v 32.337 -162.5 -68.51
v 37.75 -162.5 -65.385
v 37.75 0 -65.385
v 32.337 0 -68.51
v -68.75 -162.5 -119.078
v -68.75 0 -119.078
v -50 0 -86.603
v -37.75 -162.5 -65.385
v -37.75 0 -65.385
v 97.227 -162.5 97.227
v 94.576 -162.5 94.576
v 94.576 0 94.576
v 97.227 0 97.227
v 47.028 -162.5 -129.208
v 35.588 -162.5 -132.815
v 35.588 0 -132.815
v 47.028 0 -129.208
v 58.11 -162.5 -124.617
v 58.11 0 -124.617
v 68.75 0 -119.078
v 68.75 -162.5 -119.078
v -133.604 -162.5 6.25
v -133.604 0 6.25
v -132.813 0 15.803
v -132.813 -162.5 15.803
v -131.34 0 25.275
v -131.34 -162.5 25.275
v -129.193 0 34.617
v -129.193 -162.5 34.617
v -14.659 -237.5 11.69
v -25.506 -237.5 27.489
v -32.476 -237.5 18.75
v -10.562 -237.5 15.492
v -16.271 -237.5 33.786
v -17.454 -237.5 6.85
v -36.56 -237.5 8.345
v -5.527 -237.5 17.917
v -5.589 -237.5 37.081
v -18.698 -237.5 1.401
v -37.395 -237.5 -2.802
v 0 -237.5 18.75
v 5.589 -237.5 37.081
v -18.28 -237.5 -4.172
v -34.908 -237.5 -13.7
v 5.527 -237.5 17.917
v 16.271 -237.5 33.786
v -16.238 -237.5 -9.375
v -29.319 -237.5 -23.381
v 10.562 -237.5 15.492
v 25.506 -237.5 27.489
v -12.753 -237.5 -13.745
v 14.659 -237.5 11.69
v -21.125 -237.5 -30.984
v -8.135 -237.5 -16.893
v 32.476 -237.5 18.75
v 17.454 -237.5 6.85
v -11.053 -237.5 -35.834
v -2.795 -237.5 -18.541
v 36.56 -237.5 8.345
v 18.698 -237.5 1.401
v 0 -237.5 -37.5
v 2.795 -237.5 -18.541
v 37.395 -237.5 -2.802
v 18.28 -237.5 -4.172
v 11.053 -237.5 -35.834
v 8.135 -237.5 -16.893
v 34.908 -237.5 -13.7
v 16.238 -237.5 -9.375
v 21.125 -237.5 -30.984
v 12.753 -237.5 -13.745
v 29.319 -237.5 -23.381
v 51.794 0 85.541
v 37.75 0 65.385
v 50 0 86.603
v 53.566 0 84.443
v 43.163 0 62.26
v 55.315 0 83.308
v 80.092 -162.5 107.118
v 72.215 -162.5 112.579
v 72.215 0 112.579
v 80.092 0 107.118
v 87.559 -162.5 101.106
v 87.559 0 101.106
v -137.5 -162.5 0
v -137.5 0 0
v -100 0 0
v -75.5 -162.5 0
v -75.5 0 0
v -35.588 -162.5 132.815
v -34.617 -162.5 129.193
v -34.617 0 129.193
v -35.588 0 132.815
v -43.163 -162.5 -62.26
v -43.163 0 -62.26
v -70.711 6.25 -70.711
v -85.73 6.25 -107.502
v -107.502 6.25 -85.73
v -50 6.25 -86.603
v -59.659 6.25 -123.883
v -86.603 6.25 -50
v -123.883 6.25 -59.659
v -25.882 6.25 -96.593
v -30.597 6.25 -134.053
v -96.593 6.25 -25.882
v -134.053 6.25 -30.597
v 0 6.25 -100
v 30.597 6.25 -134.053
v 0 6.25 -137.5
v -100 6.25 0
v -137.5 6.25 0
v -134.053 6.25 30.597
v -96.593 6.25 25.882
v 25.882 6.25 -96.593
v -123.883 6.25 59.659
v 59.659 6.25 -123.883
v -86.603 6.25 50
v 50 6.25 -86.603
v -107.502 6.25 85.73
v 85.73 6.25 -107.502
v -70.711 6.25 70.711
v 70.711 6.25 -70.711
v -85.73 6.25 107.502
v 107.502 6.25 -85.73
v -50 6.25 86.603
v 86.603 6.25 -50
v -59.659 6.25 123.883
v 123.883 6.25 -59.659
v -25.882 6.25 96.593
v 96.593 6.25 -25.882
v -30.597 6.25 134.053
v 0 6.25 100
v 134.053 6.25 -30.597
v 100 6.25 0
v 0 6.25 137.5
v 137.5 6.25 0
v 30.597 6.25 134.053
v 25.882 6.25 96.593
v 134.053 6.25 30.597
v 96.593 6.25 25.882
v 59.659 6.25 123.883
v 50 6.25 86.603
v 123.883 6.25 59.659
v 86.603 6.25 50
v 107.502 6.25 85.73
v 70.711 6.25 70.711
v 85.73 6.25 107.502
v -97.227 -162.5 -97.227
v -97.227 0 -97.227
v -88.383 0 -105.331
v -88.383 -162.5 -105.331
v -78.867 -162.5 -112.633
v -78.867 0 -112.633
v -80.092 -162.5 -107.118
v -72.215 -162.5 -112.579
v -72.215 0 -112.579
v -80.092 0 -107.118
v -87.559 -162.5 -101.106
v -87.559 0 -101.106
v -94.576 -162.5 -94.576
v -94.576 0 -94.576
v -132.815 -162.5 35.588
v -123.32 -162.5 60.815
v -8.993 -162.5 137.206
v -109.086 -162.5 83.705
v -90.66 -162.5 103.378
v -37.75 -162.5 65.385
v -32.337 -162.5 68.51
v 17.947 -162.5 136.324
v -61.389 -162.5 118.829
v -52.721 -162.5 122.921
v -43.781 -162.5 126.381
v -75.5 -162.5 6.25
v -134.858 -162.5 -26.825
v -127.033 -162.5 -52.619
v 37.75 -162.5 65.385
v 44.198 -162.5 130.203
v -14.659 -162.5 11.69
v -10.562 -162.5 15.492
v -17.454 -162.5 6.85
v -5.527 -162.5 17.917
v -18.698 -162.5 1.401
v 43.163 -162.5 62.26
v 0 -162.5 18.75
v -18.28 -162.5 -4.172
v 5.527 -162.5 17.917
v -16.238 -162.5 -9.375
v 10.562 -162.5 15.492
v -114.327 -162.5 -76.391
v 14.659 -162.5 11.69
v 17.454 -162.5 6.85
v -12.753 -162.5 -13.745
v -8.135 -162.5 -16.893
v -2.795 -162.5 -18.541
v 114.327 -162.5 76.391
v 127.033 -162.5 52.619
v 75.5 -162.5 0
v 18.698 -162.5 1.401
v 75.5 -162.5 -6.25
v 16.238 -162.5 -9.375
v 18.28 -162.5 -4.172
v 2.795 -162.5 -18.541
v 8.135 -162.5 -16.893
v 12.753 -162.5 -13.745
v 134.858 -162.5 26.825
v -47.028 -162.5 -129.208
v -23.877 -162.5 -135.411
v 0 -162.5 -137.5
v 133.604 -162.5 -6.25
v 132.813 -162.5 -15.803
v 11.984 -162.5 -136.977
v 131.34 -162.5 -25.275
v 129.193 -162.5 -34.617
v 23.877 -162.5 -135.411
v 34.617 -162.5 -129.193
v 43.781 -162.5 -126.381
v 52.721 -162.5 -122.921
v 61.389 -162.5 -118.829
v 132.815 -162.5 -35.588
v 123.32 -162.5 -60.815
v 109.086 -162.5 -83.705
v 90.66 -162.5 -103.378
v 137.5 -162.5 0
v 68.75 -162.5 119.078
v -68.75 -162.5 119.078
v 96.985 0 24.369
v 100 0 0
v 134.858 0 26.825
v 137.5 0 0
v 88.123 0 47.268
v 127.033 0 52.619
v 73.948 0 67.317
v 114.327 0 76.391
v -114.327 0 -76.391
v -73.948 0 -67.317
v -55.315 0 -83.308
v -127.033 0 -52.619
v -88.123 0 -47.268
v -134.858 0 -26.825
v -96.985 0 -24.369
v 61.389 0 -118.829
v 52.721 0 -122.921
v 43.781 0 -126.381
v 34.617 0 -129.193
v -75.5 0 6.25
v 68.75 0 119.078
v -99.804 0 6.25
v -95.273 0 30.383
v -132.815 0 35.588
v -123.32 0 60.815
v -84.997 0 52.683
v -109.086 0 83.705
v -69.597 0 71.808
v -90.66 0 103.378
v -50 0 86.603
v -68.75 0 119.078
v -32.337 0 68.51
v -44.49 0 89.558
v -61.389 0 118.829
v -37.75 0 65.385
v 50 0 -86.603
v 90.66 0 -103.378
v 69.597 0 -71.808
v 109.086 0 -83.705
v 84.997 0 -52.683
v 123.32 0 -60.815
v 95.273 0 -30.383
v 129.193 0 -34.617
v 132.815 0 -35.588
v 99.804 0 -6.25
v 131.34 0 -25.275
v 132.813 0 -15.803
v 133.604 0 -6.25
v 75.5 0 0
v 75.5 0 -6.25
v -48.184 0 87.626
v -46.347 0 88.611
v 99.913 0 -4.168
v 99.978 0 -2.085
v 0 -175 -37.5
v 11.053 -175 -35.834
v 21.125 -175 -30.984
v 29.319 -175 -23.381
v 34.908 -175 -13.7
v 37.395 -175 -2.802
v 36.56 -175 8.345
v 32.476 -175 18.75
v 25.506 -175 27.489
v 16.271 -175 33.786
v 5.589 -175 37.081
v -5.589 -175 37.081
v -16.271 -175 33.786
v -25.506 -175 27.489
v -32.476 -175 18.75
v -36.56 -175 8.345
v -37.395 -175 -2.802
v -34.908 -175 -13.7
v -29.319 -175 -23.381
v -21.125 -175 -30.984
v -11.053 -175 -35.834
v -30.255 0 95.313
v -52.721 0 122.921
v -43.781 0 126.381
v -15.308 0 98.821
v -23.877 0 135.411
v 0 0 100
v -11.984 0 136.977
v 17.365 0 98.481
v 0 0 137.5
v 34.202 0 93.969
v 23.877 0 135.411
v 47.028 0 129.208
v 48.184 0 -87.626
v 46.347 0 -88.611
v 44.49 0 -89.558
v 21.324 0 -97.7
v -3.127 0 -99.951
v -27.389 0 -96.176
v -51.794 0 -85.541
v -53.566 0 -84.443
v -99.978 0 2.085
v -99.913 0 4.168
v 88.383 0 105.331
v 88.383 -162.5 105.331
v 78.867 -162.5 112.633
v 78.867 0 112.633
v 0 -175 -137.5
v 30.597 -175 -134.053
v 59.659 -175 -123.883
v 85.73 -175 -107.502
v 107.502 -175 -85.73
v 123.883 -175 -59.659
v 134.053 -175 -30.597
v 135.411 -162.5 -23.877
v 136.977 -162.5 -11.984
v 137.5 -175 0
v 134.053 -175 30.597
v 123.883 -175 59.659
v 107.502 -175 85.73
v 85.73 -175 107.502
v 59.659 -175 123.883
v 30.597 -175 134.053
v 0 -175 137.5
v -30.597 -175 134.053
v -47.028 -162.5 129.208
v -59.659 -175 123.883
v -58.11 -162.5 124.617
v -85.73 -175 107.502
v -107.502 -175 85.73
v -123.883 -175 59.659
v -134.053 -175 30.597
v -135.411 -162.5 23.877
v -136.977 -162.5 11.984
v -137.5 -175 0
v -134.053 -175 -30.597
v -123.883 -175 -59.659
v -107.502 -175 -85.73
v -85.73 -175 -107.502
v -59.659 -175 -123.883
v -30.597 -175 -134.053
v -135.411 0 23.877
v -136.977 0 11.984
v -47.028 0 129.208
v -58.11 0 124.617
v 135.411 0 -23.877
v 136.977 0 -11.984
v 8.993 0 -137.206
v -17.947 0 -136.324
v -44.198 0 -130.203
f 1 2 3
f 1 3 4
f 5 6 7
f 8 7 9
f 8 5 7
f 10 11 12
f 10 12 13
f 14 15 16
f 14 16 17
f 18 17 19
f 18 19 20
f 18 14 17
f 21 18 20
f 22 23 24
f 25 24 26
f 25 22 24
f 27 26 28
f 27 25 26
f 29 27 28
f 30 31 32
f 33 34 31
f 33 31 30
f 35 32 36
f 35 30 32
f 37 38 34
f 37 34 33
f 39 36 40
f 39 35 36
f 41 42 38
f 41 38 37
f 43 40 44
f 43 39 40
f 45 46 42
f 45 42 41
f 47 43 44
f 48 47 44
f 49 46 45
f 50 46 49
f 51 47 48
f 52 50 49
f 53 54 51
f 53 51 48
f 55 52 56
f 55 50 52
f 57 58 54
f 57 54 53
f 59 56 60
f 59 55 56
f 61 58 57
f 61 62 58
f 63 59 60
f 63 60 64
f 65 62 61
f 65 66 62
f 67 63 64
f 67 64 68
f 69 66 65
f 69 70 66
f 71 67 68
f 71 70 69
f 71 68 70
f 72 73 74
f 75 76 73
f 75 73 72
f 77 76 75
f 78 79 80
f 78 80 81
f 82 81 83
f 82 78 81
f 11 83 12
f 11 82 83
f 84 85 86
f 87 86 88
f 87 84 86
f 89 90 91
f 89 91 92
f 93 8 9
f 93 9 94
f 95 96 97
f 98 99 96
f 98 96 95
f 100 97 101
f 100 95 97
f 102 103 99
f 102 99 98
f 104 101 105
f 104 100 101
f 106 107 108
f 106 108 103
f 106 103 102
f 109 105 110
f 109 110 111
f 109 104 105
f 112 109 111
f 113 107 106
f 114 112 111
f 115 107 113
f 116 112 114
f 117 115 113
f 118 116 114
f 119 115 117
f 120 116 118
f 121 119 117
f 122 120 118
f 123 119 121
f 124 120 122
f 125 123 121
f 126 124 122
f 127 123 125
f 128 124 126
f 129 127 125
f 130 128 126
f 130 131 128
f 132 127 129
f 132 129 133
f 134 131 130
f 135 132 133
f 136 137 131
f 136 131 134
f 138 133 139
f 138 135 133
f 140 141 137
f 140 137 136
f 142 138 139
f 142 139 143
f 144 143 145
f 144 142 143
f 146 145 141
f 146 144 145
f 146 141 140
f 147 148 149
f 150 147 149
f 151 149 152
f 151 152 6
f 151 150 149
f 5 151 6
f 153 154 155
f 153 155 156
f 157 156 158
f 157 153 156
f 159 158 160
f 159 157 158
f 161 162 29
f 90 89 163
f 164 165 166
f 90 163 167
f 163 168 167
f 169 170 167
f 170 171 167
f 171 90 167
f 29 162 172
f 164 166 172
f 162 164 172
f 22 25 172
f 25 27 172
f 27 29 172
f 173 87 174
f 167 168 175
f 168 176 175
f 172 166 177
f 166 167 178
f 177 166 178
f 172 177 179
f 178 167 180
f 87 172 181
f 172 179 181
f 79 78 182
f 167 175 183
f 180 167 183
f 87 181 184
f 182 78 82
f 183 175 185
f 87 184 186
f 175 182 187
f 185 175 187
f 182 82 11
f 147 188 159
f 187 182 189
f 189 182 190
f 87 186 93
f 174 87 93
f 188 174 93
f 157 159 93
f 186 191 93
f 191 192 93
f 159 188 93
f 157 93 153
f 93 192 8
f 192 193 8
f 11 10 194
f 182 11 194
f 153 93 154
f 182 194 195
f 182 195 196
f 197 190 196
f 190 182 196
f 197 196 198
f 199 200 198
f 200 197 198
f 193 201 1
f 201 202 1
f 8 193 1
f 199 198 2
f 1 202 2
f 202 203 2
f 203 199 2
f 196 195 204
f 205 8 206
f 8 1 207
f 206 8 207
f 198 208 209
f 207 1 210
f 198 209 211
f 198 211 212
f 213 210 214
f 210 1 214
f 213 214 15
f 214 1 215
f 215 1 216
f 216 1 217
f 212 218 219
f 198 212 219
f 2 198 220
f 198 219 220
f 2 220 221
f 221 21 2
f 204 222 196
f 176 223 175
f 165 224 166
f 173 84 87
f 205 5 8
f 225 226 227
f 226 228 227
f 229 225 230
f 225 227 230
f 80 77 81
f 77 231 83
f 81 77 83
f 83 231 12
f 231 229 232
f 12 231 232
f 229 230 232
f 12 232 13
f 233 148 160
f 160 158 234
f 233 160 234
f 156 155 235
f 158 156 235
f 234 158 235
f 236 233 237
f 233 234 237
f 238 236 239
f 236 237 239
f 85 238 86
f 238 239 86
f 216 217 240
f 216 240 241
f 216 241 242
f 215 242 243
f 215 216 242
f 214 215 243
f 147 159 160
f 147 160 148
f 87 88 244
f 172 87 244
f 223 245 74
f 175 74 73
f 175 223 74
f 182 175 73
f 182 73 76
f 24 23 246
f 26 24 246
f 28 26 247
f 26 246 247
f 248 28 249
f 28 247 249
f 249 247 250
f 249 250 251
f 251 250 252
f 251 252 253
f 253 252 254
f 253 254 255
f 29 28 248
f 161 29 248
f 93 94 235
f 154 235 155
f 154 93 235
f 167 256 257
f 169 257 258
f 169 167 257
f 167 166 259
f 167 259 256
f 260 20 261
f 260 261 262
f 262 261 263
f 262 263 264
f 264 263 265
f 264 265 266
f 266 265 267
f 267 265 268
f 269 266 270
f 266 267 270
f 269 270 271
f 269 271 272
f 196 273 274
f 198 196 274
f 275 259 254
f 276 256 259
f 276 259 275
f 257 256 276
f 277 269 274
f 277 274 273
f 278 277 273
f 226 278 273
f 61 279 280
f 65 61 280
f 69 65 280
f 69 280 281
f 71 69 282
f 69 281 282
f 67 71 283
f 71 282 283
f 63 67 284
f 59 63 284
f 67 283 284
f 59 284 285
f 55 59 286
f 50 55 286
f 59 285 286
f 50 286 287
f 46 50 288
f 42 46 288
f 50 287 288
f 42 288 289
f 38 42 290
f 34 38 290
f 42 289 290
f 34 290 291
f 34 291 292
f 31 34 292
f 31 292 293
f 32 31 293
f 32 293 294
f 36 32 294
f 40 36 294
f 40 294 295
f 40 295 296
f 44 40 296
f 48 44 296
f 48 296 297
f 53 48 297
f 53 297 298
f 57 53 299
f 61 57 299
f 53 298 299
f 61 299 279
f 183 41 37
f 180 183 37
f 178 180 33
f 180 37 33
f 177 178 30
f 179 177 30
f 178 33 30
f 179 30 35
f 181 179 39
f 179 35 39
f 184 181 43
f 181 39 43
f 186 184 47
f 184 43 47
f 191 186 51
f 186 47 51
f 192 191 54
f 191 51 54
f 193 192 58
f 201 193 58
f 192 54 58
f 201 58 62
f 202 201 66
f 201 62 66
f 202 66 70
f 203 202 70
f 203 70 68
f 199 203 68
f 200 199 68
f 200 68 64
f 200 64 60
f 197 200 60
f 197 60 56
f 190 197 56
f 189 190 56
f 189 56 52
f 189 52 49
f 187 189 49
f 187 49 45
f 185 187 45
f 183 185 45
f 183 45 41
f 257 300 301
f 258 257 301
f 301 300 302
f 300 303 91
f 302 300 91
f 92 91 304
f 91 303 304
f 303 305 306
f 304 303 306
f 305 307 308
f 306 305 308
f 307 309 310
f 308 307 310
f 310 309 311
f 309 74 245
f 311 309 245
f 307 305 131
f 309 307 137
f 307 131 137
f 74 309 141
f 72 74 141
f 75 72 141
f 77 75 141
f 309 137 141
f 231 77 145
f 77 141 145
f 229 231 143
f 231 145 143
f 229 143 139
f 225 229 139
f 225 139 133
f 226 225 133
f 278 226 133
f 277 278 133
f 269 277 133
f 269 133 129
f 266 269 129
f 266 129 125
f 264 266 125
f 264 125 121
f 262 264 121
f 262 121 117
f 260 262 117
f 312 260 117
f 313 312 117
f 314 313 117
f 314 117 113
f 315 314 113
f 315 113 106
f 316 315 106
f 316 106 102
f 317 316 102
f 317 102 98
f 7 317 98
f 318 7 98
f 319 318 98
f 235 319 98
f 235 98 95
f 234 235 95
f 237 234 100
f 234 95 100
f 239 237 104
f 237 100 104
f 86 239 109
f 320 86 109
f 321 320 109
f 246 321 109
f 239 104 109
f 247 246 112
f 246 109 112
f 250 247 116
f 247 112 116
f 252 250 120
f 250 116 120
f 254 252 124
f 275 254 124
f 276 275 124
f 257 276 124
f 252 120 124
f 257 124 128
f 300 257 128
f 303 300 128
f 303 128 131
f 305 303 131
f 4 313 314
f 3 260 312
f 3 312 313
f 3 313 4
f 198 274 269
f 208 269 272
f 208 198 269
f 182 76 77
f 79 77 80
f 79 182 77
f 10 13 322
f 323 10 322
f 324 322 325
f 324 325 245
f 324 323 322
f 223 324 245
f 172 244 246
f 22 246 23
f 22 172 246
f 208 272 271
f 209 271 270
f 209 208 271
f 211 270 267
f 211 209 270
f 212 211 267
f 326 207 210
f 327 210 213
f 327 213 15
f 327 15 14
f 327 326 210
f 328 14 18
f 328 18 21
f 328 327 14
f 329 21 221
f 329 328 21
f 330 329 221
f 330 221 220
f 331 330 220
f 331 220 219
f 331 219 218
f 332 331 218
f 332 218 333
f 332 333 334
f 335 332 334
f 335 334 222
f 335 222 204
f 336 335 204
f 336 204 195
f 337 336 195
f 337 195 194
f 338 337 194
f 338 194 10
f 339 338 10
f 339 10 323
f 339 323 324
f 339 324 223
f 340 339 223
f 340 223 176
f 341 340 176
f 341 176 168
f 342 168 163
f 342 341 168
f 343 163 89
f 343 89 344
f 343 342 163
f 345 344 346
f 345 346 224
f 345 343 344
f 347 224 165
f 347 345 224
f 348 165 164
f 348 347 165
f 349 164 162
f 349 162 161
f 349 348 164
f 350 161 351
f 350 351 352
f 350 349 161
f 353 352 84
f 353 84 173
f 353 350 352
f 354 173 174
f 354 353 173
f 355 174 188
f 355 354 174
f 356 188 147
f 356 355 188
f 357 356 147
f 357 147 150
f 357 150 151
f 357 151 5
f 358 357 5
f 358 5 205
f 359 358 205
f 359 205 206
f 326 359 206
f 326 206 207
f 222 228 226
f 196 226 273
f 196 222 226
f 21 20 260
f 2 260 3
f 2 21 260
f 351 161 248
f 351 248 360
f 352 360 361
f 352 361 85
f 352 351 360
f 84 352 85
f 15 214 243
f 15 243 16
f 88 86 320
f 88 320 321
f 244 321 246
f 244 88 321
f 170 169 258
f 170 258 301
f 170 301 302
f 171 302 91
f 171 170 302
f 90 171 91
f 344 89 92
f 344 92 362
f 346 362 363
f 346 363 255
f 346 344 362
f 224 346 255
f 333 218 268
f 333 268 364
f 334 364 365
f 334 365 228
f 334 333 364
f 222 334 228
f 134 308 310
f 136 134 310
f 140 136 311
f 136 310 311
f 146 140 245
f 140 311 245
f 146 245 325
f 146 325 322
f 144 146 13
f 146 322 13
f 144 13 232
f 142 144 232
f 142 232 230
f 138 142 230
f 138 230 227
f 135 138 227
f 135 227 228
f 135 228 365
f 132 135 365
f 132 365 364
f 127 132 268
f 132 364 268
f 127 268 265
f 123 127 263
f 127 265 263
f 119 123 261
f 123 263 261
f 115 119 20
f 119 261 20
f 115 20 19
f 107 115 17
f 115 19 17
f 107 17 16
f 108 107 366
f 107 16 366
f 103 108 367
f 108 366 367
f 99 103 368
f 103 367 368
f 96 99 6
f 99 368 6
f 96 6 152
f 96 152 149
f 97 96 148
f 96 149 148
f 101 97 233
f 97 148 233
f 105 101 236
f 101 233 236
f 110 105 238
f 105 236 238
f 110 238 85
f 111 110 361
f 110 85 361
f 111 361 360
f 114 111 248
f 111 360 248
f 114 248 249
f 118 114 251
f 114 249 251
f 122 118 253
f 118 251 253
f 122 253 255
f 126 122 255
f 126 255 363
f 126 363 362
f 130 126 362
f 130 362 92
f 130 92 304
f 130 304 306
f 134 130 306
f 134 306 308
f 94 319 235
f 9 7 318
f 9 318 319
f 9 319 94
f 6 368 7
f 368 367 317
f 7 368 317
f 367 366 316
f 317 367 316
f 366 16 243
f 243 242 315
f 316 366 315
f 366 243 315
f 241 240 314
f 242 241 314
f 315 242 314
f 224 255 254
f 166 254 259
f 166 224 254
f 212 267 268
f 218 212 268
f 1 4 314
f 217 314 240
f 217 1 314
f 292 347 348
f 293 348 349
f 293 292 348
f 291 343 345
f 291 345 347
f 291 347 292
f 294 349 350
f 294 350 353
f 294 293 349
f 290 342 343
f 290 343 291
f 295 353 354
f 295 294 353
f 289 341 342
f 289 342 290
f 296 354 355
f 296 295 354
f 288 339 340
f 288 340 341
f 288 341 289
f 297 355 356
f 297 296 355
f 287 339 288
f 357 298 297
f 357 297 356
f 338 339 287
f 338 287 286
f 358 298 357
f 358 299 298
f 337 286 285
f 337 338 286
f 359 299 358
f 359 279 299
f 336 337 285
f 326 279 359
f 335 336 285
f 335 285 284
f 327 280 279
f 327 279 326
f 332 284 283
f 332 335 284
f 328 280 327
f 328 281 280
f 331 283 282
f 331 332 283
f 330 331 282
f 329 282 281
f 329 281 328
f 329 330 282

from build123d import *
from build123d.topology import SkipClean

# Parameters (mm, degrees)
SKETCH1_R                      = 137.5
BOSS_EXTRUDE1_DEPTH            = 6.25
BOSS_EXTRUDE2_START            = 162.5
BOSS_EXTRUDE2_DEPTH            = 162.5
BOSS_EXTRUDE3_START            = 12.5
SKETCH3_R                      = 137.5
BOSS_EXTRUDE3_DEPTH            = 12.5
SKETCH4_R                      = 37.5
BOSS_EXTRUDE4_DEPTH            = 62.5
CUT_EXTRUDE1_REACH             = 313.812
SKETCH5_R                      = 18.75
CUT_EXTRUDE1_DIRECTION_2_DEPTH = 312.811742082
SKETCH6_R                      = 100
CUT_EXTRUDE2_DEPTH             = 6.25


with BuildPart() as part:
    # Sketch1 → Boss-Extrude1 (new body)
    with BuildSketch(Plane(origin=(0, 0, 0), x_dir=(1, 0, 0), z_dir=(0, 1, 0))):
        with Locations(Location((0, 0, 0), (0, 0, 270))):
            Circle(SKETCH1_R)
    extrude(amount=BOSS_EXTRUDE1_DEPTH)

    # Sketch2 → Boss-Extrude2 (add)
    with SkipClean():  # the faces are left unmerged after this step: merging them gives an invalid solid
        with BuildSketch(Plane.XZ.offset(BOSS_EXTRUDE2_START)):
            with BuildLine():
                Line((137.5, 0), (75.5, 0))
                Line((75.5, 0), (75.5, -6.25))
                Line((75.5, -6.25), (133.603892159, -6.25))
                ThreePointArc((133.603892159, -6.25), (132.161525003, -20.552221504), (129.192579266, -34.617047282))
                Line((129.192579266, -34.617047282), (132.814801115, -35.587618702))
                ThreePointArc((132.814801115, -35.587618702), (136.323668439, -17.94735143), (137.5, 0))
            make_face()
            with BuildLine():
                Line((68.75, -119.07849302), (37.75, -65.384917986))
                Line((37.75, -65.384917986), (32.337341226, -68.509917986))
                Line((32.337341226, -68.509917986), (61.389287306, -118.829364654))
                ThreePointArc((61.389287306, -118.829364654), (48.282016575, -124.731348808), (34.617047282, -129.192579266))
                Line((34.617047282, -129.192579266), (35.587618702, -132.814801115))
                ThreePointArc((35.587618702, -132.814801115), (52.61897195, -127.03343572), (68.75, -119.07849302))
            make_face()
            with BuildLine():
                Line((-68.75, -119.07849302), (-37.75, -65.384917986))
                Line((-37.75, -65.384917986), (-43.162658774, -62.259917986))
                Line((-43.162658774, -62.259917986), (-72.214604853, -112.579364654))
                ThreePointArc((-72.214604853, -112.579364654), (-83.879508429, -104.179127304), (-94.575531984, -94.575531984))
                Line((-94.575531984, -94.575531984), (-97.227182413, -97.227182413))
                ThreePointArc((-97.227182413, -97.227182413), (-83.704696489, -109.08608429), (-68.75, -119.07849302))
            make_face()
            with BuildLine():
                Line((-137.5, 0), (-75.5, 0))
                Line((-75.5, 0), (-75.5, 6.25))
                Line((-75.5, 6.25), (-133.603892159, 6.25))
                ThreePointArc((-133.603892159, 6.25), (-132.161525003, 20.552221504), (-129.192579266, 34.617047282))
                Line((-129.192579266, 34.617047282), (-132.814801115, 35.587618702))
                ThreePointArc((-132.814801115, 35.587618702), (-136.323668439, 17.94735143), (-137.5, 0))
            make_face()
            with BuildLine():
                Line((-68.75, 119.07849302), (-37.75, 65.384917986))
                Line((-37.75, 65.384917986), (-32.337341226, 68.509917986))
                Line((-32.337341226, 68.509917986), (-61.389287306, 118.829364654))
                ThreePointArc((-61.389287306, 118.829364654), (-48.282016575, 124.731348808), (-34.617047282, 129.192579266))
                Line((-34.617047282, 129.192579266), (-35.587618702, 132.814801115))
                ThreePointArc((-35.587618702, 132.814801115), (-52.61897195, 127.03343572), (-68.75, 119.07849302))
            make_face()
            with BuildLine():
                Line((68.75, 119.07849302), (37.75, 65.384917986))
                Line((37.75, 65.384917986), (43.162658774, 62.259917986))
                Line((43.162658774, 62.259917986), (72.214604853, 112.579364654))
                ThreePointArc((72.214604853, 112.579364654), (83.879508429, 104.179127304), (94.575531984, 94.575531984))
                Line((94.575531984, 94.575531984), (97.227182413, 97.227182413))
                ThreePointArc((97.227182413, 97.227182413), (83.704696489, 109.08608429), (68.75, 119.07849302))
            make_face()
        extrude(amount=-BOSS_EXTRUDE2_DEPTH)

    # Sketch3 → Boss-Extrude3 (add)
    with BuildSketch(Plane.XZ.offset(162.5).offset(BOSS_EXTRUDE3_START)):
        with Locations(Location((0, 0, 0), (0, 0, 270))):
            Circle(SKETCH3_R)
    extrude(amount=-BOSS_EXTRUDE3_DEPTH)

    # Sketch4 → Boss-Extrude4 (add)
    with BuildSketch(Plane.XZ.offset(175)):
        with Locations(Location((0, 0, 0), (0, 0, 270))):
            Circle(SKETCH4_R)
    extrude(amount=BOSS_EXTRUDE4_DEPTH)

    # Sketch5 → Cut-Extrude1 (cut, up to next)
    with BuildSketch(Plane.XZ.offset(237.5), mode=Mode.PRIVATE) as cut_extrude1_sk1:
        with Locations(Location((0, 0, 0), (0, 0, 90))):
            Circle(SKETCH5_R)
    cut_extrude1_tool1 = extrude(cut_extrude1_sk1.sketch, amount=-CUT_EXTRUDE1_REACH, mode=Mode.PRIVATE) & part.part
    add(cut_extrude1_tool1.solids().sort_by_distance((0, -237.5, 0))[0], mode=Mode.SUBTRACT)

    # Sketch5 → Cut-Extrude1 direction 2 (cut)
    with BuildSketch(Plane.XZ.offset(237.5)):
        with Locations(Location((0, 0, 0), (0, 0, 90))):
            Circle(SKETCH5_R)
    extrude(amount=CUT_EXTRUDE1_DIRECTION_2_DEPTH, mode=Mode.SUBTRACT)

    # Sketch6 → Cut-Extrude2 (cut)
    with BuildSketch(Plane(origin=(0, 6.25, 0), x_dir=(1, 0, 0), z_dir=(0, 1, 0))):
        with Locations(Location((0, 0, 0), (0, 0, 270))):
            Circle(SKETCH6_R)
    extrude(amount=-CUT_EXTRUDE2_DEPTH, mode=Mode.SUBTRACT)


solid = part.part
